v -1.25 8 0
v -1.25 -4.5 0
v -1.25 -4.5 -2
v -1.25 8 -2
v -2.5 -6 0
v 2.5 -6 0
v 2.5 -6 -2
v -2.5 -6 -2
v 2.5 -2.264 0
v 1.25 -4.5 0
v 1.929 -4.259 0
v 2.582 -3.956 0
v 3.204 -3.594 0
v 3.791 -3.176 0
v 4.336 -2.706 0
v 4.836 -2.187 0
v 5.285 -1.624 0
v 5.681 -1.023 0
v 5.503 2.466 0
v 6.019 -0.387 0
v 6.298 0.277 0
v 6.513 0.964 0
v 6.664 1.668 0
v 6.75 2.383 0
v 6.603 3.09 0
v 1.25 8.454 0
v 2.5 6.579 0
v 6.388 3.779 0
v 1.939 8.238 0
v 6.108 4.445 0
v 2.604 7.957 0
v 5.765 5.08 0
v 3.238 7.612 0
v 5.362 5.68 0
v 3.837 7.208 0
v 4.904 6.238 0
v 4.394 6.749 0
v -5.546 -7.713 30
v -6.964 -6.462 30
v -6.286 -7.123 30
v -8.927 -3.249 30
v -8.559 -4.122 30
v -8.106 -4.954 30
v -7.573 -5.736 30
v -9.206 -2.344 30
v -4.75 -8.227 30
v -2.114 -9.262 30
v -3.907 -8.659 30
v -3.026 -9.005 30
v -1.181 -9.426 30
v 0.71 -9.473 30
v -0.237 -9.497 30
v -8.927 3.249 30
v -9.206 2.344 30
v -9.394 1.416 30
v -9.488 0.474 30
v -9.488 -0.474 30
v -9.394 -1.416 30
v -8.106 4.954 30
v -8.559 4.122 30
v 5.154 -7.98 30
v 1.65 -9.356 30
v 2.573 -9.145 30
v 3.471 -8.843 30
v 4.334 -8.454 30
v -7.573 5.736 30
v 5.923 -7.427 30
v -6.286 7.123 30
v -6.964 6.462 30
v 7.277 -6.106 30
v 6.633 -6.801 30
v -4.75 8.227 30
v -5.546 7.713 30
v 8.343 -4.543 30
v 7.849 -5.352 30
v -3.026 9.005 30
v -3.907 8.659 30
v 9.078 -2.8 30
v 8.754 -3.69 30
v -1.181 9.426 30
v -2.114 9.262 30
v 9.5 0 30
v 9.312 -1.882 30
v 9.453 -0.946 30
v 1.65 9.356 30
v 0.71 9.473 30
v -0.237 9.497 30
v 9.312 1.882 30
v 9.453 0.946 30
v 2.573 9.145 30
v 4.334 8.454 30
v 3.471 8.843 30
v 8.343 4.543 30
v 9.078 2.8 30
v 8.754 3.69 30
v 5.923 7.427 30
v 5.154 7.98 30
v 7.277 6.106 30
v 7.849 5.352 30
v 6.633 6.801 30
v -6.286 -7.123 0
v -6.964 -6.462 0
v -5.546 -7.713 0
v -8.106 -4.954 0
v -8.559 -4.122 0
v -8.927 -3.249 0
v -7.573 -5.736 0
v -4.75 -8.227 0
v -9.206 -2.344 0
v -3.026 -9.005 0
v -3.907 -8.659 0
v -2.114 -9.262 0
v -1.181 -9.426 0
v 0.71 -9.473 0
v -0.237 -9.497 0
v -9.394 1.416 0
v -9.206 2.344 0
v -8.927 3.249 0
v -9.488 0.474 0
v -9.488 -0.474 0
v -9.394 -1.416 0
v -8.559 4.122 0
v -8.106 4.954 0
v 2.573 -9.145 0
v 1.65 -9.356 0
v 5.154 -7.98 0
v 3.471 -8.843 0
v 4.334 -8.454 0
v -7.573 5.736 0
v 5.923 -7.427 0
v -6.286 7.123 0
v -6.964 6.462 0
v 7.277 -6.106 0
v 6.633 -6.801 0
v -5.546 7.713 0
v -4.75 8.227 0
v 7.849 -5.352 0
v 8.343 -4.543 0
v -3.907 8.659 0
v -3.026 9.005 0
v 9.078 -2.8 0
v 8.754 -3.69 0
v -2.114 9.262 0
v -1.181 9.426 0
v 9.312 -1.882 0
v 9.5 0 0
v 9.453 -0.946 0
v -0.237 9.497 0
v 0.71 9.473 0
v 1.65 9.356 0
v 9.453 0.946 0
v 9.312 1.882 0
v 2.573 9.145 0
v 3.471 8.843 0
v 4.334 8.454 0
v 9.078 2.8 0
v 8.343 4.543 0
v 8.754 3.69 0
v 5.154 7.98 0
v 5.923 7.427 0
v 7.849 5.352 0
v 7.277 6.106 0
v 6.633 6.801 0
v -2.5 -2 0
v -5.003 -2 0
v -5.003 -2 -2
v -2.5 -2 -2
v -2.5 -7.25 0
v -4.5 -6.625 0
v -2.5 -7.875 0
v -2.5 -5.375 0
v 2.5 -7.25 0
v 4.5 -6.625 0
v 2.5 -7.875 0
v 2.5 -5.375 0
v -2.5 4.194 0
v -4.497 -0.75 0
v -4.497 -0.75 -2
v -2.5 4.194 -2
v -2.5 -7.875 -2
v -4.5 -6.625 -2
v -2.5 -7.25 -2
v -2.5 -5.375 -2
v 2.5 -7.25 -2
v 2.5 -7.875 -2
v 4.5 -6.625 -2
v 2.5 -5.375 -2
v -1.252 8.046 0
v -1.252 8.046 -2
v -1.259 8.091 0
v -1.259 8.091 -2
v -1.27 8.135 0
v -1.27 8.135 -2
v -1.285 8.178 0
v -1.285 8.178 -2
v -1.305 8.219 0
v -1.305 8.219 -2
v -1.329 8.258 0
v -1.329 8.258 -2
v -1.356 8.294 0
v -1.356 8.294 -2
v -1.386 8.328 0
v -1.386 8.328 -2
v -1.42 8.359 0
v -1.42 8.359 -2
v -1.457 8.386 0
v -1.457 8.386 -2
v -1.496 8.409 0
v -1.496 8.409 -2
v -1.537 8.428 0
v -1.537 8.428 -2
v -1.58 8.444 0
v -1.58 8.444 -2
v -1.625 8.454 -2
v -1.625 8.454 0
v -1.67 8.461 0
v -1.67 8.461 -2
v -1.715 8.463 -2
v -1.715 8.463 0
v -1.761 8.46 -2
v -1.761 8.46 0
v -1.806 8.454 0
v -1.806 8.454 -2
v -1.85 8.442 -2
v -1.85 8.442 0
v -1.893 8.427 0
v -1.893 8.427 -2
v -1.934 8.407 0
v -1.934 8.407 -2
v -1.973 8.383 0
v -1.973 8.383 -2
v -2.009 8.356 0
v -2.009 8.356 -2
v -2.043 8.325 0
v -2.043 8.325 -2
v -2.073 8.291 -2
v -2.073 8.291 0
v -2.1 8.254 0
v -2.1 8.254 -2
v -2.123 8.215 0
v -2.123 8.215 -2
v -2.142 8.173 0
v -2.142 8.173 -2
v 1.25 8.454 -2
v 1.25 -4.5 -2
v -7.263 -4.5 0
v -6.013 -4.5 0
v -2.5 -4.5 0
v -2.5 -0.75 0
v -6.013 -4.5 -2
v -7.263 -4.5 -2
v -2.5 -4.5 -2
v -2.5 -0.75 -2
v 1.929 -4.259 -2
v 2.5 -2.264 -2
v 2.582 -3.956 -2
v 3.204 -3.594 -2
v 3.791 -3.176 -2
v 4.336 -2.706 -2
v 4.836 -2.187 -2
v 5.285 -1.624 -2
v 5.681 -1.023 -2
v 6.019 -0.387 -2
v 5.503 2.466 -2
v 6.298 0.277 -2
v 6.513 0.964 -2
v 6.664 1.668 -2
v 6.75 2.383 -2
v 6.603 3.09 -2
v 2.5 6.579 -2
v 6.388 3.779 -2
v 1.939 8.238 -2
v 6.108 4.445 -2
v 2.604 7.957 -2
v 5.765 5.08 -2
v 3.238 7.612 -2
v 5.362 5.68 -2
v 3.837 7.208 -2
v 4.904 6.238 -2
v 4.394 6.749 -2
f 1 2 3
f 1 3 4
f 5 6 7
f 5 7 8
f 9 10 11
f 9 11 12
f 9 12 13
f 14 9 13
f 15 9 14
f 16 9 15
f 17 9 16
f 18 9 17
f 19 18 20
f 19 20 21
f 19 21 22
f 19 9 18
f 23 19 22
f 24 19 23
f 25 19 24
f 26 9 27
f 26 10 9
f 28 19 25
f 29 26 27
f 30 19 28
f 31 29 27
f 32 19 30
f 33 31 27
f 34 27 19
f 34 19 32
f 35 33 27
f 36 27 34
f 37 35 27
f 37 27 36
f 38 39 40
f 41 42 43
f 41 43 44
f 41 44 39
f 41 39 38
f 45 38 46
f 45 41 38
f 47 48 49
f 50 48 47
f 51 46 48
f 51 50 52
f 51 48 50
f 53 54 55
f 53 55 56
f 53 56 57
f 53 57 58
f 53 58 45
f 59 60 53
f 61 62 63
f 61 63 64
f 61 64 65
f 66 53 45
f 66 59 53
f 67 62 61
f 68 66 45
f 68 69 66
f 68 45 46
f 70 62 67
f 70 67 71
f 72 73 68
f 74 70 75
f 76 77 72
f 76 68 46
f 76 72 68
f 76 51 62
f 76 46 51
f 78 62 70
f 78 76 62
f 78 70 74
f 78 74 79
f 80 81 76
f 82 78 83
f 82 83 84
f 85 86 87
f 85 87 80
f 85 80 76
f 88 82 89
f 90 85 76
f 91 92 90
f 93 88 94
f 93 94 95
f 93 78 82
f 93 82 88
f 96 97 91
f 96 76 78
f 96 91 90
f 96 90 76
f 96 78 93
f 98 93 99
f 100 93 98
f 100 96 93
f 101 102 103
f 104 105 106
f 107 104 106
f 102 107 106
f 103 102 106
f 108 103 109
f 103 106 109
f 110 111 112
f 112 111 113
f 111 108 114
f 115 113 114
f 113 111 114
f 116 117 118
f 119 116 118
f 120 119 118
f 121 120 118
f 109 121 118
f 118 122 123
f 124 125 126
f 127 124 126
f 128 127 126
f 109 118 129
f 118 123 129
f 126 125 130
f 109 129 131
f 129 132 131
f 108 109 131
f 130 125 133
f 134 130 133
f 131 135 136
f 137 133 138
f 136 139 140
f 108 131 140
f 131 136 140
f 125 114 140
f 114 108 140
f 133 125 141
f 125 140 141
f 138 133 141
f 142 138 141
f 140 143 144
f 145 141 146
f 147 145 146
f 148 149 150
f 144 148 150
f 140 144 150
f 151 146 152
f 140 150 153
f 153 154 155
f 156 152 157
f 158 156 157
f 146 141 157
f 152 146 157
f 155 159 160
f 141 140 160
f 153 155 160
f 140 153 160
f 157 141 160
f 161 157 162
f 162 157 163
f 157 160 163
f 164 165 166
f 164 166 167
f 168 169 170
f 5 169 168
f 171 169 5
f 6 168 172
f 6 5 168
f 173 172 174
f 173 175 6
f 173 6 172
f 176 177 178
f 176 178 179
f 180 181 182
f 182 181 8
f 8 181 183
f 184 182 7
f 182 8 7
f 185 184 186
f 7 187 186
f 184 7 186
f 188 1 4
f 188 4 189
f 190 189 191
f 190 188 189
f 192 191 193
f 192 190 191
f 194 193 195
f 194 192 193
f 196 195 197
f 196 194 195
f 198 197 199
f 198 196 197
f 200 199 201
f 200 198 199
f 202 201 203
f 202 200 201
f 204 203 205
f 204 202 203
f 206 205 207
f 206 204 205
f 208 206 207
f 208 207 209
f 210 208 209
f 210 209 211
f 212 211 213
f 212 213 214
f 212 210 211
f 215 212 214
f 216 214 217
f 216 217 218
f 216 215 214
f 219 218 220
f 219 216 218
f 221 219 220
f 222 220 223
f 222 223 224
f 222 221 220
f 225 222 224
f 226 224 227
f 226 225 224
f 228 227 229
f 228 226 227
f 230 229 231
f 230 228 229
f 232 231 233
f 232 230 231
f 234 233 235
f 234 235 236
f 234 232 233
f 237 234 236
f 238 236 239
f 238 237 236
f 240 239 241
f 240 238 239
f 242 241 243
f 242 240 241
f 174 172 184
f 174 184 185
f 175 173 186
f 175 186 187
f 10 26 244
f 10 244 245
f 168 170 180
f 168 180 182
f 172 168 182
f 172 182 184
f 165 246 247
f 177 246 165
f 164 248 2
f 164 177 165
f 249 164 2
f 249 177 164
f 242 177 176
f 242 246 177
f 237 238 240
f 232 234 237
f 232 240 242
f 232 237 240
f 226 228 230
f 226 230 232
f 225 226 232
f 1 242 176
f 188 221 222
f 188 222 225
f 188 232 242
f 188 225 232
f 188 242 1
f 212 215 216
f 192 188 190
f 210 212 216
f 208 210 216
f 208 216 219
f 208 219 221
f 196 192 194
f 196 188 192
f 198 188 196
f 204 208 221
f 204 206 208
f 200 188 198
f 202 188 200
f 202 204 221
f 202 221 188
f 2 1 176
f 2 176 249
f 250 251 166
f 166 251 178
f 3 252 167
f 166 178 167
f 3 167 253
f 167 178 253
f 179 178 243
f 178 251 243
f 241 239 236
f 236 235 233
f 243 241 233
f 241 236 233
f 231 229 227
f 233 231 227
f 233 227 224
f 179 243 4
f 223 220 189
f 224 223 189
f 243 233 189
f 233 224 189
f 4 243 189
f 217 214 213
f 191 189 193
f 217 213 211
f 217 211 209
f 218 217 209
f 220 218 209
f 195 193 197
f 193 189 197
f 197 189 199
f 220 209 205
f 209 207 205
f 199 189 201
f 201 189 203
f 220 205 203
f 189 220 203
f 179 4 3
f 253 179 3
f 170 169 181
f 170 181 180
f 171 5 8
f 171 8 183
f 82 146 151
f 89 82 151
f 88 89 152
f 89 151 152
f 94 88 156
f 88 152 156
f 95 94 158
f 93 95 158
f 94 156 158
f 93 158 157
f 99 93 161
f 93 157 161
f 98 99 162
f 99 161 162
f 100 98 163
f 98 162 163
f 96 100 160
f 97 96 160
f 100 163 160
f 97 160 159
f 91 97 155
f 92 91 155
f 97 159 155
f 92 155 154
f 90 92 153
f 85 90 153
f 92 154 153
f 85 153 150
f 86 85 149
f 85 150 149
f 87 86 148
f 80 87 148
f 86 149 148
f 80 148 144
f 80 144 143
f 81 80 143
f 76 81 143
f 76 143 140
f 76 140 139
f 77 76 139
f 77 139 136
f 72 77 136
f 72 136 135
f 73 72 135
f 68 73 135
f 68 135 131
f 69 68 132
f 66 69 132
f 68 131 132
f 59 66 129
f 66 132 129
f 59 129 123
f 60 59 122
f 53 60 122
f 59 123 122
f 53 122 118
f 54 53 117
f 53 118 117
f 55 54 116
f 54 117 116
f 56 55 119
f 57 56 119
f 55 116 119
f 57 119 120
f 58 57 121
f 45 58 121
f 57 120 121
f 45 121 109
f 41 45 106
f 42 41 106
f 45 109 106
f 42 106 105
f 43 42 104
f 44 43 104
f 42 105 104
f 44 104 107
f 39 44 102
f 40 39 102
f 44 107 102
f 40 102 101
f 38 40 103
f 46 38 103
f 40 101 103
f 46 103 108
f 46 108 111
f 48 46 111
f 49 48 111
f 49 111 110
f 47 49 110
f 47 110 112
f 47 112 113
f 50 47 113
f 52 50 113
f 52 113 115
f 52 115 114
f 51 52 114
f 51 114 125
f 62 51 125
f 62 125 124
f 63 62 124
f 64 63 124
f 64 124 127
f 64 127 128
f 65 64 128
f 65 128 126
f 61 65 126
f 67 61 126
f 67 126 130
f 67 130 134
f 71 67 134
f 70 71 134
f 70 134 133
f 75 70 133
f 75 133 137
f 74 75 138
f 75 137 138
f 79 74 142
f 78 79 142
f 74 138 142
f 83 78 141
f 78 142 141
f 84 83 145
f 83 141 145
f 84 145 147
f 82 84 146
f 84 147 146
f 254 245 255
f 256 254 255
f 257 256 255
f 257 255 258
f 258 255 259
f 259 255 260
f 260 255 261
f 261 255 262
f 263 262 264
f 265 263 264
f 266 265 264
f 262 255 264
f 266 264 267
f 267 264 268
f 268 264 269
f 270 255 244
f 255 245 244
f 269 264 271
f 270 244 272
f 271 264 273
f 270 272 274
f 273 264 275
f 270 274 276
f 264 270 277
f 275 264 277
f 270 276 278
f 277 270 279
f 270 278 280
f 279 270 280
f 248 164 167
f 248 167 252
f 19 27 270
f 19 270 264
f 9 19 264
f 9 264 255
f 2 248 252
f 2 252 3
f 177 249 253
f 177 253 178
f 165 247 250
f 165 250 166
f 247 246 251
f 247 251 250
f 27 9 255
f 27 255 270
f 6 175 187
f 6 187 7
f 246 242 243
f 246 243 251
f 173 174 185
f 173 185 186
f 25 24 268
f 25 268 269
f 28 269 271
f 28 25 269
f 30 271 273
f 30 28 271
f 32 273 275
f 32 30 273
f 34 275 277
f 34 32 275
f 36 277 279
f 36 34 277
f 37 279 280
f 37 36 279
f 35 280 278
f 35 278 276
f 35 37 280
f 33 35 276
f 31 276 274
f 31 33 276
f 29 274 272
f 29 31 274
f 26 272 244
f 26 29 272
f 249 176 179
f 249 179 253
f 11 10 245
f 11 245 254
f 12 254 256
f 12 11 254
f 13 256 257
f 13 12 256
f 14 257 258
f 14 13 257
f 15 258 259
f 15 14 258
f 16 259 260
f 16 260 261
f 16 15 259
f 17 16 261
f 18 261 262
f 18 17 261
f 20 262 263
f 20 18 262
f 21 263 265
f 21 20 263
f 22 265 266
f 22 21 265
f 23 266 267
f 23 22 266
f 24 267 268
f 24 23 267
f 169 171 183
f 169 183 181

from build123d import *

# Parameters (mm, degrees)
F1_DEPTH = 2
F0_R     = 9.5
F2_DEPTH = 30


with BuildPart() as f1:
    # F0 (on Top) → F1 (new body)
    with BuildSketch(Plane.XY):
        with BuildLine():
            Line((-2.5, -4.5), (-1.25, -4.5))
            Line((-1.25, -4.5), (-1.25, 8))
            ThreePointArc((-1.25, 8), (-1.6246096615, 8.4544378581), (-2.1421771094, 8.1734216623))
            Line((-2.1421771094, 8.1734216623), (-7.2625718321, -4.5))
            Line((-7.2625718321, -4.5), (-6.0125718321, -4.5))
            Line((-6.0125718321, -4.5), (-5.0025062675, -2))
            Line((-5.0025062675, -2), (-2.5, -2))
            Line((-2.5, -2), (-2.5, -4.5))
        make_face()
        Polygon((-2.5, -0.75), (-4.4974734852, -0.75), (-2.5, 4.1939203632), align=None, mode=Mode.SUBTRACT)
    extrude(amount=-F1_DEPTH)


with BuildPart() as f1b:
    # F0 (on Top) → F1, piece 2 (new body)
    with BuildSketch(Plane.XY):
        with BuildLine():
            Line((1.25, 8.4544378581), (1.25, -4.5))
            ThreePointArc((1.25, -4.5), (5.067050605, -1.9109756291), (6.75, 2.3832767911))
            ThreePointArc((6.75, 2.3832767911), (4.9037938648, 6.237624312), (1.25, 8.4544378581))
        make_face()
        Polygon((2.5, -2.2643063941), (2.5, 6.5785330377), (5.502712767, 2.4655844973), align=None, mode=Mode.SUBTRACT)
    extrude(amount=-F1_DEPTH)


with BuildPart() as f1c:
    # F0 (on Top) → F1, piece 3 (new body)
    with BuildSketch(Plane.XY):
        Polygon((2.5, -6), (-2.5, -6), (-2.5, -5.375), (-4.5, -6.625), (-2.5, -7.875), (-2.5, -7.25), (2.5, -7.25), (2.5, -7.875), (4.5, -6.625), (2.5, -5.375), align=None)
    extrude(amount=-F1_DEPTH)


with BuildPart() as f2:
    # F0 (on Top) → F2 (new body)
    with BuildSketch(Plane.XY):
        Circle(F0_R)
        Polygon((-2.5, -5.375), (-2.5, -6), (2.5, -6), (2.5, -5.375), (4.5, -6.625), (2.5, -7.875), (2.5, -7.25), (-2.5, -7.25), (-2.5, -7.875), (-4.5, -6.625), align=None, mode=Mode.SUBTRACT)
        with BuildLine():
            Line((-1.25, 8), (-1.25, -4.5))
            Line((-1.25, -4.5), (-2.5, -4.5))
            Line((-2.5, -4.5), (-2.5, -2))
            Line((-2.5, -2), (-5.0025062675, -2))
            Line((-5.0025062675, -2), (-6.0125718321, -4.5))
            Line((-6.0125718321, -4.5), (-7.2625718321, -4.5))
            Line((-7.2625718321, -4.5), (-2.1421771094, 8.1734216623))
            ThreePointArc((-2.1421771094, 8.1734216623), (-1.6246096615, 8.4544378581), (-1.25, 8))
        make_face(mode=Mode.SUBTRACT)
        with BuildLine():
            ThreePointArc((6.75, 2.3832767911), (5.067050605, -1.9109756291), (1.25, -4.5))
            Line((1.25, -4.5), (1.25, 8.4544378581))
            ThreePointArc((1.25, 8.4544378581), (4.9037938648, 6.237624312), (6.75, 2.3832767911))
        make_face(mode=Mode.SUBTRACT)
        with BuildLine():
            Line((1.25, 8.4544378581), (1.25, -4.5))
            ThreePointArc((1.25, -4.5), (5.067050605, -1.9109756291), (6.75, 2.3832767911))
            ThreePointArc((6.75, 2.3832767911), (4.9037938648, 6.237624312), (1.25, 8.4544378581))
        make_face()
        Polygon((2.5, -2.2643063941), (2.5, 6.5785330377), (5.502712767, 2.4655844973), align=None, mode=Mode.SUBTRACT)
        with BuildLine():
            Line((-2.5, -4.5), (-1.25, -4.5))
            Line((-1.25, -4.5), (-1.25, 8))
            ThreePointArc((-1.25, 8), (-1.6246096615, 8.4544378581), (-2.1421771094, 8.1734216623))
            Line((-2.1421771094, 8.1734216623), (-7.2625718321, -4.5))
            Line((-7.2625718321, -4.5), (-6.0125718321, -4.5))
            Line((-6.0125718321, -4.5), (-5.0025062675, -2))
            Line((-5.0025062675, -2), (-2.5, -2))
            Line((-2.5, -2), (-2.5, -4.5))
        make_face()
        Polygon((-2.5, -0.75), (-4.4974734852, -0.75), (-2.5, 4.1939203632), align=None, mode=Mode.SUBTRACT)
        Polygon((5.502712767, 2.4655844973), (2.5, 6.5785330377), (2.5, -2.2643063941), align=None)
        Polygon((2.5, -6), (-2.5, -6), (-2.5, -5.375), (-4.5, -6.625), (-2.5, -7.875), (-2.5, -7.25), (2.5, -7.25), (2.5, -7.875), (4.5, -6.625), (2.5, -5.375), align=None)
        Polygon((-2.5, 4.1939203632), (-4.4974734852, -0.75), (-2.5, -0.75), align=None)
    extrude(amount=F2_DEPTH)


solid = Compound([f1.part, f1b.part, f1c.part, f2.part])
